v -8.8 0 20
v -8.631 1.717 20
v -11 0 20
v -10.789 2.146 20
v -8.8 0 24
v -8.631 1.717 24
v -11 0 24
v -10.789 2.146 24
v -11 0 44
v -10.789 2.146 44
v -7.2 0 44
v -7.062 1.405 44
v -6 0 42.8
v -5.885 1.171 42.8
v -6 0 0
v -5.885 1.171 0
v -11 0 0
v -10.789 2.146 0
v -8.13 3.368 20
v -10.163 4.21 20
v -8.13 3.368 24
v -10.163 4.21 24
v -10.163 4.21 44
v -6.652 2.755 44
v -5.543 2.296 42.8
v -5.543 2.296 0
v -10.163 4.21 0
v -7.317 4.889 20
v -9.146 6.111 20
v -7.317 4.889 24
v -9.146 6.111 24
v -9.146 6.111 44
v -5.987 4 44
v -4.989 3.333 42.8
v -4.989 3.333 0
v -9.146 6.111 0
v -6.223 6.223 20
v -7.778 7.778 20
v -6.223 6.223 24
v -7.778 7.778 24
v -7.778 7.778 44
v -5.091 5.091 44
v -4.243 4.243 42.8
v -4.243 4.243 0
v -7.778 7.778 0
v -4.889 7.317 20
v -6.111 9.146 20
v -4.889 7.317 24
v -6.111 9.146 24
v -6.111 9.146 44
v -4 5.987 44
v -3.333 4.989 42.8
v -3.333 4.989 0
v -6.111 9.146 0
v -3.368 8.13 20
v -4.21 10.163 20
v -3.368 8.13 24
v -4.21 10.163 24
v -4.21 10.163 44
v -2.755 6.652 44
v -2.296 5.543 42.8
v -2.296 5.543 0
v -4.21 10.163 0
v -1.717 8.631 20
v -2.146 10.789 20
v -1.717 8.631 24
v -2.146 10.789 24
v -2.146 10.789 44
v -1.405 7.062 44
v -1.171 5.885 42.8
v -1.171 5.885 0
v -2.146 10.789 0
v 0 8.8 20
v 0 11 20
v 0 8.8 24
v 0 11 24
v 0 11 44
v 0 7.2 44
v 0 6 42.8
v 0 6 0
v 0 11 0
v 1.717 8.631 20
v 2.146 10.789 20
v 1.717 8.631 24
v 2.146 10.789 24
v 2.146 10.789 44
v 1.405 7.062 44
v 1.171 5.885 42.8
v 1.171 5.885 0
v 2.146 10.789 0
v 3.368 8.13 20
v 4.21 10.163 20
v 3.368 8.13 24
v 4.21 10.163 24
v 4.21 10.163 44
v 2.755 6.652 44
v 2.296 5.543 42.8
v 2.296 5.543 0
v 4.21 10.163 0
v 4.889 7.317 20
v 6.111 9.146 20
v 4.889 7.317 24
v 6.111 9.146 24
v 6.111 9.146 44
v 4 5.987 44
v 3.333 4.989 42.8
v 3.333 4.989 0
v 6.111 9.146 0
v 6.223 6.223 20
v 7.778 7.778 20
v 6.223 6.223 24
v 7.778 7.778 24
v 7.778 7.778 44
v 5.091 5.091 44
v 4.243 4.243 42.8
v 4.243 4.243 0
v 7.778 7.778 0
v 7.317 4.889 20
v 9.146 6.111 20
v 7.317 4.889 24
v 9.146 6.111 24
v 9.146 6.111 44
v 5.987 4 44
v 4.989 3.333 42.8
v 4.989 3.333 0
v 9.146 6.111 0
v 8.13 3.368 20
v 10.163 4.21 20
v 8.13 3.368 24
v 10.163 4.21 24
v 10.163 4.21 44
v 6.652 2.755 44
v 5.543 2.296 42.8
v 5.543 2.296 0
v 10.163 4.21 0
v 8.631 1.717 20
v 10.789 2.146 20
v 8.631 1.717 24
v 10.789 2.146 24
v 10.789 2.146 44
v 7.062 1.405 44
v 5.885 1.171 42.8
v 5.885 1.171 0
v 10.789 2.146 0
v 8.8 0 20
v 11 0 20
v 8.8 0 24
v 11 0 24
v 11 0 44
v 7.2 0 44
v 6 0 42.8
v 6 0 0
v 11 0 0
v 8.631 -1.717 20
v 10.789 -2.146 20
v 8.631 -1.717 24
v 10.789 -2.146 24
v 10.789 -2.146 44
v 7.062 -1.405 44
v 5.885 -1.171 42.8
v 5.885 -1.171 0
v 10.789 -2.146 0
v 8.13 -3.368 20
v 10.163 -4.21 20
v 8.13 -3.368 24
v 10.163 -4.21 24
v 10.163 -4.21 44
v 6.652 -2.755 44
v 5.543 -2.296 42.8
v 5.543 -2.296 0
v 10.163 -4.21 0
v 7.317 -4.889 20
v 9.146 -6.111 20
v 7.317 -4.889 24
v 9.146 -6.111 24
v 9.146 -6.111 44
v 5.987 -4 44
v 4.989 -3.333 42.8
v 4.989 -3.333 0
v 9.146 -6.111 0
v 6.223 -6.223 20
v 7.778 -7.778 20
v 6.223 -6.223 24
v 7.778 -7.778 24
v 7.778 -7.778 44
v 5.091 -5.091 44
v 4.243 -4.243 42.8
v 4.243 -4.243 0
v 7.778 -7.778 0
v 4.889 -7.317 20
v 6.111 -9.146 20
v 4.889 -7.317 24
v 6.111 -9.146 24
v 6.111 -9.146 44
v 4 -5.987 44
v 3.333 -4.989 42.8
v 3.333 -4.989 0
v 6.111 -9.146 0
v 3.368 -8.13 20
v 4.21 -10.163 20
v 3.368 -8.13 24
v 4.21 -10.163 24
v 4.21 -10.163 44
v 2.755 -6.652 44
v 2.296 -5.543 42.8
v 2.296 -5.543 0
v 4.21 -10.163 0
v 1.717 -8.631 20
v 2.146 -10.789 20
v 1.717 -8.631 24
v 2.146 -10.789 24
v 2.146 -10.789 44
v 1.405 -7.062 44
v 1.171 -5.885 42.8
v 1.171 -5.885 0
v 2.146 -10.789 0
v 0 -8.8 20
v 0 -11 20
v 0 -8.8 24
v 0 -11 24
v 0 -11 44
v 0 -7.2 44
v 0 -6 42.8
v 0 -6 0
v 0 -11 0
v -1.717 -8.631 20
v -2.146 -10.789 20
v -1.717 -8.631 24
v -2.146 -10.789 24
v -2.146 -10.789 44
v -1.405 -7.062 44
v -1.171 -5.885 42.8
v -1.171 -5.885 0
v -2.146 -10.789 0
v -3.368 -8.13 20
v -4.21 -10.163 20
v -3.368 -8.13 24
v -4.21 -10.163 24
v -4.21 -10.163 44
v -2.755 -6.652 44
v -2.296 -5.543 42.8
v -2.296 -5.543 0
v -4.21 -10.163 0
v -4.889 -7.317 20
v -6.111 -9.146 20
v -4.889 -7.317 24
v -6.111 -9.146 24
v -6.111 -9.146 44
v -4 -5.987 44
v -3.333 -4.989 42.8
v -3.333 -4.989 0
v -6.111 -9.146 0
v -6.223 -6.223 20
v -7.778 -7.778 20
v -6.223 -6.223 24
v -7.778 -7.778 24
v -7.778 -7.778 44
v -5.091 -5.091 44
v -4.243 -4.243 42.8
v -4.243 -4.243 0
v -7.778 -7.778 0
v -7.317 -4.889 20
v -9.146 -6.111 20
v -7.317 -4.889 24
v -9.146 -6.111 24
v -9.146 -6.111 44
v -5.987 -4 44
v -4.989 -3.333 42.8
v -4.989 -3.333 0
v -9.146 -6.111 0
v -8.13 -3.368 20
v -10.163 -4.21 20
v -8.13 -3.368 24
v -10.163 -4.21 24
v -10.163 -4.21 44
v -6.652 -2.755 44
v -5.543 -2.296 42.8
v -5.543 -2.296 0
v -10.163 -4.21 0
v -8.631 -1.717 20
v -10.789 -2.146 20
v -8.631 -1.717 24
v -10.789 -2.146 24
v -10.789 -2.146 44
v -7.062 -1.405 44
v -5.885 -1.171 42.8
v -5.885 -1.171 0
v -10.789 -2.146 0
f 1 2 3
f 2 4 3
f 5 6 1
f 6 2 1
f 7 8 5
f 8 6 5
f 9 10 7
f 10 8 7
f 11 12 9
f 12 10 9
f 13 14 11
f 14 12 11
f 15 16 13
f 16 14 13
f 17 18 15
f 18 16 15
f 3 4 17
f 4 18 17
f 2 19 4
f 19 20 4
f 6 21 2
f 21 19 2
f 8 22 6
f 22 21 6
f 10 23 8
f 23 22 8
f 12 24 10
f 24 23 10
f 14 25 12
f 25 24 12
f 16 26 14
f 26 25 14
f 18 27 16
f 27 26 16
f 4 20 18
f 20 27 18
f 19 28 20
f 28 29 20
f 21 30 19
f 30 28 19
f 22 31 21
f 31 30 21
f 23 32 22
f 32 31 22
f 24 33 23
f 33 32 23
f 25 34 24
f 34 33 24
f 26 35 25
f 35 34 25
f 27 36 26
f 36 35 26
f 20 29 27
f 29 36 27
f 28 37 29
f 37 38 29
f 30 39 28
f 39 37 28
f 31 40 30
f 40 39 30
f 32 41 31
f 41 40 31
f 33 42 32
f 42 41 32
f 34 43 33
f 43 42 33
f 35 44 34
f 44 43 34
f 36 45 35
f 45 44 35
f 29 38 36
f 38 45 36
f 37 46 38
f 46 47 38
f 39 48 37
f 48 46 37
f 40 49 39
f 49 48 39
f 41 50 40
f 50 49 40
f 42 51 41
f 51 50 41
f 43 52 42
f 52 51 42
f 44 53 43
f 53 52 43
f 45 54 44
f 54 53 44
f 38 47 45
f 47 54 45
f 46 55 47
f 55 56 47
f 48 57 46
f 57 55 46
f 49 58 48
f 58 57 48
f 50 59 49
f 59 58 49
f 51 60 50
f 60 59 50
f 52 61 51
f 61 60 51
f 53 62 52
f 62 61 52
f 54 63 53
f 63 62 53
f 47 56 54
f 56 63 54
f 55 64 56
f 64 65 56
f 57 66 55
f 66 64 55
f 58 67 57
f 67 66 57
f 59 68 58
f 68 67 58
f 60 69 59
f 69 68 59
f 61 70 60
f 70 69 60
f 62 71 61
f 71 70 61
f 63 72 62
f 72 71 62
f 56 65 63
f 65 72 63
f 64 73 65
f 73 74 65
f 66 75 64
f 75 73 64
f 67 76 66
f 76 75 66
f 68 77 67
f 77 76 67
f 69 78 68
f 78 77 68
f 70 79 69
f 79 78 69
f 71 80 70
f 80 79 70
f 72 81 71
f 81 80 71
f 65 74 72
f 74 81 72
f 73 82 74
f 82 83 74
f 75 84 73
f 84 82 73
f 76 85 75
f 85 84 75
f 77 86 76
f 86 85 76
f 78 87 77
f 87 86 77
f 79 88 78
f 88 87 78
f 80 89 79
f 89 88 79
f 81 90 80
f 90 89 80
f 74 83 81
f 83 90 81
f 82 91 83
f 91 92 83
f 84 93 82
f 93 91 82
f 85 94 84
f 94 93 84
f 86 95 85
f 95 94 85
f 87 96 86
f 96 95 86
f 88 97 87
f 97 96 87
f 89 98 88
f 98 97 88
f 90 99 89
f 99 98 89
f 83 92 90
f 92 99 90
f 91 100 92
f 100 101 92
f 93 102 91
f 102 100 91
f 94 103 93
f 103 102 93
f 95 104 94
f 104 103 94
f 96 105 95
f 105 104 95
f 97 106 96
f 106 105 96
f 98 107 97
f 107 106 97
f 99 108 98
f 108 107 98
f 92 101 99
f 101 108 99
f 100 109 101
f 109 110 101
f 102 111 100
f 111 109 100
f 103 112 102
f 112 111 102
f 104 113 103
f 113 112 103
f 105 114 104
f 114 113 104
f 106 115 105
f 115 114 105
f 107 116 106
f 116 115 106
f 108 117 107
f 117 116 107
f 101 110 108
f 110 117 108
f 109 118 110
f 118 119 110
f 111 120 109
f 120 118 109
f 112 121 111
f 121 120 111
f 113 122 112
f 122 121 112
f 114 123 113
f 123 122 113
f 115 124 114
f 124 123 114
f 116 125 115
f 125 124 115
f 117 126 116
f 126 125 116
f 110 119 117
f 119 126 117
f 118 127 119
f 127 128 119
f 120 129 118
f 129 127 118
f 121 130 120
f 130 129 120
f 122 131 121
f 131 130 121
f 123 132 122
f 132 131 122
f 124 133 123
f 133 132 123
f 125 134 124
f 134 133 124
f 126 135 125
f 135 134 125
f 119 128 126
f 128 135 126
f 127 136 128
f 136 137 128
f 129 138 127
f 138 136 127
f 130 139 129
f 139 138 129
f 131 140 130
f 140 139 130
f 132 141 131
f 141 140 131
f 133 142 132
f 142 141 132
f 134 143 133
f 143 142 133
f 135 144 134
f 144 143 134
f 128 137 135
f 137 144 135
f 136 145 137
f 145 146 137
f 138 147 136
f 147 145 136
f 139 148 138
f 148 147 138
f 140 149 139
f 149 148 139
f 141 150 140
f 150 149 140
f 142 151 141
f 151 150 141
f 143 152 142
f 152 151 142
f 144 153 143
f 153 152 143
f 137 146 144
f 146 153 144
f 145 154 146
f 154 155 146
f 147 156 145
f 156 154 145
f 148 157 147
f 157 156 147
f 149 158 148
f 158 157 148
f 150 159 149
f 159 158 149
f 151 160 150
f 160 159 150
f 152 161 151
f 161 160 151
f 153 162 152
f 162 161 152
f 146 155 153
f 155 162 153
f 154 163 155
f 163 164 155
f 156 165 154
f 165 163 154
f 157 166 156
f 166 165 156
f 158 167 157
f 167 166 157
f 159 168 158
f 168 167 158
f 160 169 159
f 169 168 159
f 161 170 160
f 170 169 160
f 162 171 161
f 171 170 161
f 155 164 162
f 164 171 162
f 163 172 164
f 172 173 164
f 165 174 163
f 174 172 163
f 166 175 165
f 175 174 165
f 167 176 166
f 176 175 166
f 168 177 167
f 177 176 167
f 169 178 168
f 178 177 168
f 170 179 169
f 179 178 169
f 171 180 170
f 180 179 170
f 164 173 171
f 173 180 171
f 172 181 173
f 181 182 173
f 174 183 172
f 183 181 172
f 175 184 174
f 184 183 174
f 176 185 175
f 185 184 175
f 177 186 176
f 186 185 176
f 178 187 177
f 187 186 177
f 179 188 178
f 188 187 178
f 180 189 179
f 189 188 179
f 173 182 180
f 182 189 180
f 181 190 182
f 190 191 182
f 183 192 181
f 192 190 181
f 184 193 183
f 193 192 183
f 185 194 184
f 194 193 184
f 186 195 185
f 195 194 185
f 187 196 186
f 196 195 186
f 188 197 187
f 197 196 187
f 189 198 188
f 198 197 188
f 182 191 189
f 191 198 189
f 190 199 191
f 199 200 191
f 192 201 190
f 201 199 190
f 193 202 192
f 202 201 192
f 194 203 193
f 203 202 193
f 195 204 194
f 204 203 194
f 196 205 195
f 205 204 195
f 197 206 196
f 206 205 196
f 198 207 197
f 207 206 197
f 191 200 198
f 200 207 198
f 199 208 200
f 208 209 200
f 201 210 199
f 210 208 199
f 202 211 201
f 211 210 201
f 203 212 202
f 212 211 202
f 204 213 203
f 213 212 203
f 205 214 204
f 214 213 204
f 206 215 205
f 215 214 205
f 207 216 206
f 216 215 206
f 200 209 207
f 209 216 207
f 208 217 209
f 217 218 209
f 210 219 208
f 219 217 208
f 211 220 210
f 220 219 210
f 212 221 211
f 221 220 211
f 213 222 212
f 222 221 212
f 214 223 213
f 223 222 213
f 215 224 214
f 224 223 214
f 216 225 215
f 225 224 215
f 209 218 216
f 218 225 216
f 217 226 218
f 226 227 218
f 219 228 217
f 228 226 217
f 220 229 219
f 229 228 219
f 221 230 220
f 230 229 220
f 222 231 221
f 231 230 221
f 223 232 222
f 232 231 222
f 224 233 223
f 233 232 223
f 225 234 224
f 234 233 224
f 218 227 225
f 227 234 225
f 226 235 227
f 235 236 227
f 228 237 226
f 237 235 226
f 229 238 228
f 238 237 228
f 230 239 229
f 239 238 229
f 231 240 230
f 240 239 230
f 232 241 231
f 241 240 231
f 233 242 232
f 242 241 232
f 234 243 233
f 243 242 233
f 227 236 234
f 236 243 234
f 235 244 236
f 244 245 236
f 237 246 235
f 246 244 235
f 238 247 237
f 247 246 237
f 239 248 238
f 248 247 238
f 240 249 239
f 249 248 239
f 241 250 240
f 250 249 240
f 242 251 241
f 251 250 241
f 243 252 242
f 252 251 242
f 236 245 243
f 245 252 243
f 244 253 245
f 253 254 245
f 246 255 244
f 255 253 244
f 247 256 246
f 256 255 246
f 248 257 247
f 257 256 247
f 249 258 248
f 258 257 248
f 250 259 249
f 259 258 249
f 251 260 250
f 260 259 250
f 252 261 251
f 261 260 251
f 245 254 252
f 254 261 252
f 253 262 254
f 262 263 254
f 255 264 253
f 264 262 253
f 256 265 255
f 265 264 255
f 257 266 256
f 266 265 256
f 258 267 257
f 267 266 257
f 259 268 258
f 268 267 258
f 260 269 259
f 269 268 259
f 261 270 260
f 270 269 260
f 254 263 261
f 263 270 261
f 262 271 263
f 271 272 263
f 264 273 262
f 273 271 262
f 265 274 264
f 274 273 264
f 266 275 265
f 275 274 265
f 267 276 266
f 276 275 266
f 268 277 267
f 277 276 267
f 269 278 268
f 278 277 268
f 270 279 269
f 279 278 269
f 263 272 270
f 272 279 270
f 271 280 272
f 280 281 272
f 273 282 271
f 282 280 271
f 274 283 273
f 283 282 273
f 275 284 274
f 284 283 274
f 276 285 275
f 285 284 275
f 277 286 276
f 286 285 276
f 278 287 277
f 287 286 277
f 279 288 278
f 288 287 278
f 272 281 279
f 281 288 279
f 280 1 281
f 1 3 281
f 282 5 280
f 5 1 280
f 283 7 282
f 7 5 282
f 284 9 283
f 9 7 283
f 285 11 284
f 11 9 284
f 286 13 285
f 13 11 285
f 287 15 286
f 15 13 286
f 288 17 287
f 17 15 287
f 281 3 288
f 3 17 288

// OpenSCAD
$fn = 32;

// ----------------------------------------------------------------------
// Grooved revolve: thread_relief, bore R6
// ----------------------------------------------------------------------

// --- parameters (mm) ---
bore_r = 6;               // bore radius
outer_r = 11;             // outer radius of the body
total_h = 44;             // overall height, Z
wall = 5;                 // radial wall thickness
groove_w = 4;             // groove width
groove_d = 2.2;           // groove depth
grooves = 1;              // number of outer grooves
relief = 1.2;             // thread relief leg at the bore mouth
relief_angle = 45;        // thread relief chamfer angle, degrees
fit_tol = 0.05;           // declared fit tolerance (prompt contract)
free_tol = 0.2;           // declared free tolerance (prompt contract)

bbox_x = 2 * outer_r;  // full diameter
bore_d = 2 * bore_r;  // bore diameter
body_d = 2 * outer_r;  // body diameter
revolve_angle = 360;  // full turn around the Z axis

profile = [[6, 0], [11, 0], [11, 20], [8.8, 20], [8.8, 24], [11, 24], [11, 44], [7.2, 44], [6, 42.8]];  // primary outline, 9 points, counter clockwise

// --- the one profile operation ---
rotate_extrude(angle = revolve_angle) polygon(points = profile);
